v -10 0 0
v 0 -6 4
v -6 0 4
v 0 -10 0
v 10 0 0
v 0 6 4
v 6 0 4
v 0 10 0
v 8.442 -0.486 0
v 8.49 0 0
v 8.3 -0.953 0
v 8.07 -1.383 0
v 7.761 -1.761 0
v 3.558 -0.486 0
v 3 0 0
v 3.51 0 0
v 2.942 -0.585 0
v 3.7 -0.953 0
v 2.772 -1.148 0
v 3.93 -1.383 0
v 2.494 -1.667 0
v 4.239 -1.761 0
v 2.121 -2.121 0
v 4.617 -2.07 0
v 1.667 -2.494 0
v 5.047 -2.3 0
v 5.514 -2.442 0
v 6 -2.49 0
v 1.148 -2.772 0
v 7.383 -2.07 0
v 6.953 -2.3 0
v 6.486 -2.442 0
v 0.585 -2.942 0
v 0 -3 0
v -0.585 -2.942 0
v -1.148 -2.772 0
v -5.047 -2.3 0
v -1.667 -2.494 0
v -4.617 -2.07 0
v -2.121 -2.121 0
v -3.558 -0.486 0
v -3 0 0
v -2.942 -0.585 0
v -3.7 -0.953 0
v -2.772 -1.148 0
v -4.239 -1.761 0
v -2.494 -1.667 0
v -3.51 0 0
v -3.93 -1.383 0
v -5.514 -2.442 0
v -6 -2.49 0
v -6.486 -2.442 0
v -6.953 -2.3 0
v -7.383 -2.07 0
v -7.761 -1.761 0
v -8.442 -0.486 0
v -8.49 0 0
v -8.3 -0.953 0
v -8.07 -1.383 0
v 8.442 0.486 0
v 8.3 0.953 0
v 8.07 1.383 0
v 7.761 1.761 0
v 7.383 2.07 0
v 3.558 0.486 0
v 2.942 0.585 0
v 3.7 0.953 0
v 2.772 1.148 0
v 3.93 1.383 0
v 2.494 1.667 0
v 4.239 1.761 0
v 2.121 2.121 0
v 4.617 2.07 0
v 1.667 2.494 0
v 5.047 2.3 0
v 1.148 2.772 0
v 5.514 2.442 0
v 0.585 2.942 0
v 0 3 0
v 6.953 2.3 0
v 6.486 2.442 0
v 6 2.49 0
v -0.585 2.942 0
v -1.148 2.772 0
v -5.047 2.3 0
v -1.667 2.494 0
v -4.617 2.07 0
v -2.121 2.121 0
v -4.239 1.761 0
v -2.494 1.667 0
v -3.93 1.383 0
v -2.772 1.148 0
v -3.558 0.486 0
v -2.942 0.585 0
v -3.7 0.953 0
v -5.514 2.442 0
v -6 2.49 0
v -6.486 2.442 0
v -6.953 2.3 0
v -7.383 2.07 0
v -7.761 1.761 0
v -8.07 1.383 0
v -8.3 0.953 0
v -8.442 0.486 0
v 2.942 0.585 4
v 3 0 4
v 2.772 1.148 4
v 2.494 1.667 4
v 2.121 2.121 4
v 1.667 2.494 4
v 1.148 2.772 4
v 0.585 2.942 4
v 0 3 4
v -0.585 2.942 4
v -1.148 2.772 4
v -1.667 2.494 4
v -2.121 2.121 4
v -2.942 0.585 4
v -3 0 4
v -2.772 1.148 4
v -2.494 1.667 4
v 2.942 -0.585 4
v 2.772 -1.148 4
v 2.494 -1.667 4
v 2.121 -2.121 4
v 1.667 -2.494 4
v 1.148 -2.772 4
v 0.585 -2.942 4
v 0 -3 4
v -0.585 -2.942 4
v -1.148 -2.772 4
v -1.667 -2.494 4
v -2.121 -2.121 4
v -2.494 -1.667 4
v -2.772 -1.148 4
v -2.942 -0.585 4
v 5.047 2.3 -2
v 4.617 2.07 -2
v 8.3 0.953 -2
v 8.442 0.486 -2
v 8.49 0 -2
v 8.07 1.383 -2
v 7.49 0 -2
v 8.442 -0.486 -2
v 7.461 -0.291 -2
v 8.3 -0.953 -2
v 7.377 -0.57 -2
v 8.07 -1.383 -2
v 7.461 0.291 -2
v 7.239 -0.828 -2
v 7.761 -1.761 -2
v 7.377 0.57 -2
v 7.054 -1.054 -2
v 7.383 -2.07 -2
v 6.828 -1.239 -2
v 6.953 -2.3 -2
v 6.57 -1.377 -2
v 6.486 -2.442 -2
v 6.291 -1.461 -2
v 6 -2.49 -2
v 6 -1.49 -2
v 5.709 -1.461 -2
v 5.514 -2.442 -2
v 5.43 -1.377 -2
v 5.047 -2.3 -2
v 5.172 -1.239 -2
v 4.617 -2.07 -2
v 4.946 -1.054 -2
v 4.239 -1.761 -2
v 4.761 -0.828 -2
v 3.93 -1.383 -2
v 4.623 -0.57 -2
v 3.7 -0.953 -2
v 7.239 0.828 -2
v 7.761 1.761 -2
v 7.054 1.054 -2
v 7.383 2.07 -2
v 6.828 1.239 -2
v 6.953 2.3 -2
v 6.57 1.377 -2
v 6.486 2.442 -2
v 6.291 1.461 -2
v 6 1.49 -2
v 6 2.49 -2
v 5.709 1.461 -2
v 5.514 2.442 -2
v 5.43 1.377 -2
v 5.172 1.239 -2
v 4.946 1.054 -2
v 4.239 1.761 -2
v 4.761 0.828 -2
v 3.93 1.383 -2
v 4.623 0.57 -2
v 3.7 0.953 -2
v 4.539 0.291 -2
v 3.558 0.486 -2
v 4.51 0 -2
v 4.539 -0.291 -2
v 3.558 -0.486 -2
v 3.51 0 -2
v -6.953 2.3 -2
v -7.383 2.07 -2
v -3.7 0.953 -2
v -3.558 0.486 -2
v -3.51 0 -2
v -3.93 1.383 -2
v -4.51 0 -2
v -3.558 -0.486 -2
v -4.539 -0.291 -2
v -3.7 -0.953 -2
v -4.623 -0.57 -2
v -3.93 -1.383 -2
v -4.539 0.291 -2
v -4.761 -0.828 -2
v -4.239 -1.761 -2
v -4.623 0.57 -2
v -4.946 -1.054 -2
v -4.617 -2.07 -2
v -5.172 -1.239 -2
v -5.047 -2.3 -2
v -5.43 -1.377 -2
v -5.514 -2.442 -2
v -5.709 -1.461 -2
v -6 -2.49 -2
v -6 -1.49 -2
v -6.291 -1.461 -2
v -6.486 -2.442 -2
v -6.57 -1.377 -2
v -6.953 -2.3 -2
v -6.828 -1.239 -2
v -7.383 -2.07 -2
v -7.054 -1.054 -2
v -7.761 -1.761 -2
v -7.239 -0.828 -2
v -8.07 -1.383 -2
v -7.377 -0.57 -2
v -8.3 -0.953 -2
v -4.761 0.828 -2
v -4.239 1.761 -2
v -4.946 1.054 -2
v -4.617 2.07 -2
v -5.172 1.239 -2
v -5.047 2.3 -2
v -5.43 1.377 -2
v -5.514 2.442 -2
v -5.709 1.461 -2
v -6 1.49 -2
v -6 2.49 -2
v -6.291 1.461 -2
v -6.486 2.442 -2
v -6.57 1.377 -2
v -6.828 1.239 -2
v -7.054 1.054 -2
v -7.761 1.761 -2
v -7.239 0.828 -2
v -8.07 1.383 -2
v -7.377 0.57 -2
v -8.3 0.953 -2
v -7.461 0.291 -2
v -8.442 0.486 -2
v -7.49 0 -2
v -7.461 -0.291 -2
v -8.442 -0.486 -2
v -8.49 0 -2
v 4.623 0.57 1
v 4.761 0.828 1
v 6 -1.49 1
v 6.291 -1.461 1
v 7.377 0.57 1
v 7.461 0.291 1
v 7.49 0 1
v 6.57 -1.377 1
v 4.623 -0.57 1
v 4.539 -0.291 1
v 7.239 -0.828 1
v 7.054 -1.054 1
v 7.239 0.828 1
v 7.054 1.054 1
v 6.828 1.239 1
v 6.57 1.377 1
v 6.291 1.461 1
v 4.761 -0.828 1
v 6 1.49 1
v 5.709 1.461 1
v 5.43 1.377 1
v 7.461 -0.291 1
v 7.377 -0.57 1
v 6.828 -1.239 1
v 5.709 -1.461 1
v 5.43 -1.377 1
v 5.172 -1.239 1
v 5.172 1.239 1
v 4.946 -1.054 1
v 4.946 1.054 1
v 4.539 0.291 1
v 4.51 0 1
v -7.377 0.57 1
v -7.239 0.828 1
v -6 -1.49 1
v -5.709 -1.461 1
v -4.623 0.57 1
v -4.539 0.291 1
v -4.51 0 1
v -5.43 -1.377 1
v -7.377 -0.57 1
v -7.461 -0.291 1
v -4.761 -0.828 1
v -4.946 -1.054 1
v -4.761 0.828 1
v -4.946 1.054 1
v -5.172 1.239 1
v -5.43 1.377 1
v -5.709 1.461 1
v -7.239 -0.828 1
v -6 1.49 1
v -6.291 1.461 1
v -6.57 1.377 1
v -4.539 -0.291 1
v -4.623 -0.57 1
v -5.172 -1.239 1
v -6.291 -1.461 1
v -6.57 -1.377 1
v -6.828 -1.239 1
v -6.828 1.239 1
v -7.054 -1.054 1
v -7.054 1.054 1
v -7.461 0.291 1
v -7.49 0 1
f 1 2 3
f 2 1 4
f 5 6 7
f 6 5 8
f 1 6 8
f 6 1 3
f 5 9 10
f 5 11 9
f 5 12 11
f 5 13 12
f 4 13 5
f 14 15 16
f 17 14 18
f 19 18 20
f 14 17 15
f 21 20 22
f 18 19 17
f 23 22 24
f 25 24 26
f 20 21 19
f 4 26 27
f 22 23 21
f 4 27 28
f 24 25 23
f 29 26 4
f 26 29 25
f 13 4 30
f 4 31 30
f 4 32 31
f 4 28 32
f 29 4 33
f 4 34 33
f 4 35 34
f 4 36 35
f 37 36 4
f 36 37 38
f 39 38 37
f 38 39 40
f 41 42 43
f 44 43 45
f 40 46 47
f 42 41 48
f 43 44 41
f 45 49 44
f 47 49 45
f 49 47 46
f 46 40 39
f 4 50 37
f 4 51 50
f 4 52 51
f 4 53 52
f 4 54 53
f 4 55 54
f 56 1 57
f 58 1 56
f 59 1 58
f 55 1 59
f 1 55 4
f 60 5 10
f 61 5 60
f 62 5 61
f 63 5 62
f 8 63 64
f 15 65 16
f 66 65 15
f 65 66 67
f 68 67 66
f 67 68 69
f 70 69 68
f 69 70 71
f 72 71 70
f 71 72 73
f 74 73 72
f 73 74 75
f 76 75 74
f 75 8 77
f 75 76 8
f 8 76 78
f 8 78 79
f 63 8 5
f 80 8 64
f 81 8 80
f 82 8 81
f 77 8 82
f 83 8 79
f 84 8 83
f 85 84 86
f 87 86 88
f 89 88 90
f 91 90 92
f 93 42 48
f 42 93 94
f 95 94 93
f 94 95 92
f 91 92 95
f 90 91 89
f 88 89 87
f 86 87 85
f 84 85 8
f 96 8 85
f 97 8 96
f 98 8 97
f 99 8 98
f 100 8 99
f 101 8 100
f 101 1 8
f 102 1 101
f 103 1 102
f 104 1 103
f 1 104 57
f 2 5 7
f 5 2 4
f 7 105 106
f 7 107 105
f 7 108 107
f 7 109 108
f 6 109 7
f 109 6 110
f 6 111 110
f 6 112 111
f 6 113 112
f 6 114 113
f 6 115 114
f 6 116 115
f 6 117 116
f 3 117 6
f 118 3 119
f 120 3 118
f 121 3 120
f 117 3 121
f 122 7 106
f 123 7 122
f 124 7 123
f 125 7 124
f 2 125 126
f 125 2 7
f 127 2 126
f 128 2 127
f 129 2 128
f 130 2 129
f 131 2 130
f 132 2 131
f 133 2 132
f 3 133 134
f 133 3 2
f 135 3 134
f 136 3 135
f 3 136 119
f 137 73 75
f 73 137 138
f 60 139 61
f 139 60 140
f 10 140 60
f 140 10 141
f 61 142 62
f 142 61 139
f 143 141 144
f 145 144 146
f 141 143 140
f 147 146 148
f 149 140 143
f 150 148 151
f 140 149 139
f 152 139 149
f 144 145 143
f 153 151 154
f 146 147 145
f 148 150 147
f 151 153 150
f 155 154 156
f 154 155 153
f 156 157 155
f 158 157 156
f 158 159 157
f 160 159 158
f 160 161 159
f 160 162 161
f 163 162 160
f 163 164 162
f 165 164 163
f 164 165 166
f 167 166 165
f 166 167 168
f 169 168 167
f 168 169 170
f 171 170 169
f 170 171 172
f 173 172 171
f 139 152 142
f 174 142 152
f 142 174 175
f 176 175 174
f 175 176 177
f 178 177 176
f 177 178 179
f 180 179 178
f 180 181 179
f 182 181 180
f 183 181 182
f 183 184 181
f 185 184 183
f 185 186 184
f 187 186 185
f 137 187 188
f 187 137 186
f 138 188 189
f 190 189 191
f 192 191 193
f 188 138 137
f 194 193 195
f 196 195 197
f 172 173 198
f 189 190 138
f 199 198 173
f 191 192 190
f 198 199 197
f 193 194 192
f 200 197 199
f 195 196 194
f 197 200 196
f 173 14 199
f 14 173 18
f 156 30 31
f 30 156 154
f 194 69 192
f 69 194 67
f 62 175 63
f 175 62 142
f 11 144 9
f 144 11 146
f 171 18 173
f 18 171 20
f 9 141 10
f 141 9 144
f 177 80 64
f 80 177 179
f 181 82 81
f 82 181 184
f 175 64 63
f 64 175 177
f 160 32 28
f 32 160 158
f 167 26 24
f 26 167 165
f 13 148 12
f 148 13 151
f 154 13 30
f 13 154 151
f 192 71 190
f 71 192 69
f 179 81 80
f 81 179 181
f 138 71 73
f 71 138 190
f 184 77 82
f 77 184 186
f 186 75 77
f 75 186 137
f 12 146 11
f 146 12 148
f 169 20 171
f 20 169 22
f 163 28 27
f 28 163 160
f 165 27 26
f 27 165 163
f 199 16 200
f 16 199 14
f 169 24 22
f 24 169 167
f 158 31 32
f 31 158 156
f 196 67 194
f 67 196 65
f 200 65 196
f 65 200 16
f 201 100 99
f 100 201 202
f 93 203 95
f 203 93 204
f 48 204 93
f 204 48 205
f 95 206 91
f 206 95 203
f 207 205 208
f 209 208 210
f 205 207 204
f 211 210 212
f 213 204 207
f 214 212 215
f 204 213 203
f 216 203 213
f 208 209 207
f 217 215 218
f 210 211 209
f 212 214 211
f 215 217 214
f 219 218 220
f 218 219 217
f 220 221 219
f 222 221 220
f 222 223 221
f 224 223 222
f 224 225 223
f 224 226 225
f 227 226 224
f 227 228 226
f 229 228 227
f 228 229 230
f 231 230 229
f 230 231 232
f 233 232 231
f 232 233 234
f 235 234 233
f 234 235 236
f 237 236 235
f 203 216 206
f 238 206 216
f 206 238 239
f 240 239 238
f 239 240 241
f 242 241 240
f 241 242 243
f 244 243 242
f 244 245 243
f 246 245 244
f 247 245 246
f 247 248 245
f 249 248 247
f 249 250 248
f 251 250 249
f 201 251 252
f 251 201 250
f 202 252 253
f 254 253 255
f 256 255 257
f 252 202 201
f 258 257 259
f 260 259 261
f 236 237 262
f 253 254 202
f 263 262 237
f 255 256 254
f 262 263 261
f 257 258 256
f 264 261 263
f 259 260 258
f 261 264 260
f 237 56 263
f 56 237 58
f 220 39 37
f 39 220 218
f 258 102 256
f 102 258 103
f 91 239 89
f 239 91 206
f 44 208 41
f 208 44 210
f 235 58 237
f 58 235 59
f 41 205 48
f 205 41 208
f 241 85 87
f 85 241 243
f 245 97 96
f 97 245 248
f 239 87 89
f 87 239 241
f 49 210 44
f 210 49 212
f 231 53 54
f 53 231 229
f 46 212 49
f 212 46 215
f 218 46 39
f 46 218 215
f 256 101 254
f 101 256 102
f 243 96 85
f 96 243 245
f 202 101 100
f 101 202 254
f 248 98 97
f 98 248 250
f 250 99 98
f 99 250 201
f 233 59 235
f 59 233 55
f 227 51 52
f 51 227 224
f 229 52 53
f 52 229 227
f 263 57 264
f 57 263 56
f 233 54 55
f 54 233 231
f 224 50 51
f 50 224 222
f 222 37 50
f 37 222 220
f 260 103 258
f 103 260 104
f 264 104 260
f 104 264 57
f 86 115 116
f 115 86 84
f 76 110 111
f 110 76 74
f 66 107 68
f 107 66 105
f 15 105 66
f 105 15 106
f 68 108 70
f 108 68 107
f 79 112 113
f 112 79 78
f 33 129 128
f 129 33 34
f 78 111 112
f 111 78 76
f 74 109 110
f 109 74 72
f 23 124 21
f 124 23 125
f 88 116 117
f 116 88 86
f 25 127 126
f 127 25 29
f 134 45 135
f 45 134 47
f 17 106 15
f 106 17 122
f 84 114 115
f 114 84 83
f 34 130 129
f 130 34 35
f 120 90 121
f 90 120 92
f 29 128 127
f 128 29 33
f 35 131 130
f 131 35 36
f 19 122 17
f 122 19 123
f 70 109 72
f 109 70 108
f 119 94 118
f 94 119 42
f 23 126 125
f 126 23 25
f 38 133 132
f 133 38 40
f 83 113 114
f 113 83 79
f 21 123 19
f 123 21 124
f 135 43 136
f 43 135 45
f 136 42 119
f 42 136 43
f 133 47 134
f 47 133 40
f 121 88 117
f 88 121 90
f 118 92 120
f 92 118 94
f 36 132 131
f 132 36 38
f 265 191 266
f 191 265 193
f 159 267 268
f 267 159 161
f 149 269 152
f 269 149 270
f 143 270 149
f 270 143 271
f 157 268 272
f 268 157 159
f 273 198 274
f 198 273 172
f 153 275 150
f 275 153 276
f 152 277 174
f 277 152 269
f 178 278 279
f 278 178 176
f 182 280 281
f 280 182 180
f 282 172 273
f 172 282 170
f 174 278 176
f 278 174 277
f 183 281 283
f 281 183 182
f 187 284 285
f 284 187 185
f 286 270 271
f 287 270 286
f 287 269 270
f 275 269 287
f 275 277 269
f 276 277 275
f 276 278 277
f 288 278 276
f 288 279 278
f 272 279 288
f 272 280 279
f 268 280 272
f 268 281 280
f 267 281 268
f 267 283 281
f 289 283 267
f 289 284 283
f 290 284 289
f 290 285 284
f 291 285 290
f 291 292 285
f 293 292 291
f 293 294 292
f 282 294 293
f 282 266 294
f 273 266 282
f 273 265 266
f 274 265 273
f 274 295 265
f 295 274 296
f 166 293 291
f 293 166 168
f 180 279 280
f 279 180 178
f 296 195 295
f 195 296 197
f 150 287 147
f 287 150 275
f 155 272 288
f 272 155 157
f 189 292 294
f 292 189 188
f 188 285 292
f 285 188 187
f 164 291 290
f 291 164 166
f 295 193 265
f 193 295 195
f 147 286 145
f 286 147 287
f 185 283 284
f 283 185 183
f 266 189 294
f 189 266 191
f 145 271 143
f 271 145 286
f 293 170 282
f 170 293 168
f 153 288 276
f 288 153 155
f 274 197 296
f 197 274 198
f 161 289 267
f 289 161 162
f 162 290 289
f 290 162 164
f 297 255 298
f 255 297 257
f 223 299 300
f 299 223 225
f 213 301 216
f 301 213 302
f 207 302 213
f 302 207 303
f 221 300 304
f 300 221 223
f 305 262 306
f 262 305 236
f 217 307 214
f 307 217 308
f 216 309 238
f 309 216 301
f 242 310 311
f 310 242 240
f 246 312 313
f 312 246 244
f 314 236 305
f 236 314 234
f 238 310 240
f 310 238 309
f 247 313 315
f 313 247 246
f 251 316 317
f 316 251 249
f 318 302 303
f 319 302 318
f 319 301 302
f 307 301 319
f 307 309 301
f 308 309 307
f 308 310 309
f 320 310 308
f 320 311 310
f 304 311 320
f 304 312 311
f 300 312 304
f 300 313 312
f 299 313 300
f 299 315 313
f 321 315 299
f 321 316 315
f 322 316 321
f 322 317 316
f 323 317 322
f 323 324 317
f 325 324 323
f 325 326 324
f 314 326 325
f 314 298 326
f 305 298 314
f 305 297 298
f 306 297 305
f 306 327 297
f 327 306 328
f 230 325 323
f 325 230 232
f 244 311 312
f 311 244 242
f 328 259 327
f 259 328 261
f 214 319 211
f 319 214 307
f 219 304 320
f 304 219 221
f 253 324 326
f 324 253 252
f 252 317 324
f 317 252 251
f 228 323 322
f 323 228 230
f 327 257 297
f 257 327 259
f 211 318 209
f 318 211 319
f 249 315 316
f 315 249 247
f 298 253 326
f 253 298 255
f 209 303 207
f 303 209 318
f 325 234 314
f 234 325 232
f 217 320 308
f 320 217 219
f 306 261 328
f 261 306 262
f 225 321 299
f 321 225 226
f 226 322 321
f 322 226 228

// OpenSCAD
screwHoleR=1.49;

color("silver") {
  medalBeltClip();
  //translate([0,0,-5]) medalBeltClipBacking();
}

module medalBeltClip() {
  difference() {
    union() {
      cylinder(r1=10, r2=6,h=4,$fn=4);
      translate([6,0,-2]) cylinder(r=screwHoleR+1,h=2,$fn=32);
      translate([-6,0,-2]) cylinder(r=screwHoleR+1,h=2,$fn=32);
    }
    translate([0,0,-3]) cylinder(r=3,h=30,$fn=32);
    translate([6,0,-3]) cylinder(r=screwHoleR,h=4,$fn=32);
    translate([-6,0,-3]) cylinder(r=screwHoleR,h=4,$fn=32);
  }
}

module medalBeltClipBacking() {
  difference() {
    cylinder(r=10,h=2,$fn=32);
    translate([0,0,-1]) cylinder(r=3,h=30,$fn=32);
    translate([6,0,-1]) cylinder(r=screwHoleR+0.1,h=5,$fn=32);
    translate([-6,0,-1]) cylinder(r=screwHoleR+0.1,h=5,$fn=32);

    translate([6,0,-1]) cylinder(r=3,h=2,$fn=32);
    translate([-6,0,-1]) cylinder(r=3,h=2,$fn=32);
    translate([-6,-3,-1]) cube([12,6,2]);

  }
}
